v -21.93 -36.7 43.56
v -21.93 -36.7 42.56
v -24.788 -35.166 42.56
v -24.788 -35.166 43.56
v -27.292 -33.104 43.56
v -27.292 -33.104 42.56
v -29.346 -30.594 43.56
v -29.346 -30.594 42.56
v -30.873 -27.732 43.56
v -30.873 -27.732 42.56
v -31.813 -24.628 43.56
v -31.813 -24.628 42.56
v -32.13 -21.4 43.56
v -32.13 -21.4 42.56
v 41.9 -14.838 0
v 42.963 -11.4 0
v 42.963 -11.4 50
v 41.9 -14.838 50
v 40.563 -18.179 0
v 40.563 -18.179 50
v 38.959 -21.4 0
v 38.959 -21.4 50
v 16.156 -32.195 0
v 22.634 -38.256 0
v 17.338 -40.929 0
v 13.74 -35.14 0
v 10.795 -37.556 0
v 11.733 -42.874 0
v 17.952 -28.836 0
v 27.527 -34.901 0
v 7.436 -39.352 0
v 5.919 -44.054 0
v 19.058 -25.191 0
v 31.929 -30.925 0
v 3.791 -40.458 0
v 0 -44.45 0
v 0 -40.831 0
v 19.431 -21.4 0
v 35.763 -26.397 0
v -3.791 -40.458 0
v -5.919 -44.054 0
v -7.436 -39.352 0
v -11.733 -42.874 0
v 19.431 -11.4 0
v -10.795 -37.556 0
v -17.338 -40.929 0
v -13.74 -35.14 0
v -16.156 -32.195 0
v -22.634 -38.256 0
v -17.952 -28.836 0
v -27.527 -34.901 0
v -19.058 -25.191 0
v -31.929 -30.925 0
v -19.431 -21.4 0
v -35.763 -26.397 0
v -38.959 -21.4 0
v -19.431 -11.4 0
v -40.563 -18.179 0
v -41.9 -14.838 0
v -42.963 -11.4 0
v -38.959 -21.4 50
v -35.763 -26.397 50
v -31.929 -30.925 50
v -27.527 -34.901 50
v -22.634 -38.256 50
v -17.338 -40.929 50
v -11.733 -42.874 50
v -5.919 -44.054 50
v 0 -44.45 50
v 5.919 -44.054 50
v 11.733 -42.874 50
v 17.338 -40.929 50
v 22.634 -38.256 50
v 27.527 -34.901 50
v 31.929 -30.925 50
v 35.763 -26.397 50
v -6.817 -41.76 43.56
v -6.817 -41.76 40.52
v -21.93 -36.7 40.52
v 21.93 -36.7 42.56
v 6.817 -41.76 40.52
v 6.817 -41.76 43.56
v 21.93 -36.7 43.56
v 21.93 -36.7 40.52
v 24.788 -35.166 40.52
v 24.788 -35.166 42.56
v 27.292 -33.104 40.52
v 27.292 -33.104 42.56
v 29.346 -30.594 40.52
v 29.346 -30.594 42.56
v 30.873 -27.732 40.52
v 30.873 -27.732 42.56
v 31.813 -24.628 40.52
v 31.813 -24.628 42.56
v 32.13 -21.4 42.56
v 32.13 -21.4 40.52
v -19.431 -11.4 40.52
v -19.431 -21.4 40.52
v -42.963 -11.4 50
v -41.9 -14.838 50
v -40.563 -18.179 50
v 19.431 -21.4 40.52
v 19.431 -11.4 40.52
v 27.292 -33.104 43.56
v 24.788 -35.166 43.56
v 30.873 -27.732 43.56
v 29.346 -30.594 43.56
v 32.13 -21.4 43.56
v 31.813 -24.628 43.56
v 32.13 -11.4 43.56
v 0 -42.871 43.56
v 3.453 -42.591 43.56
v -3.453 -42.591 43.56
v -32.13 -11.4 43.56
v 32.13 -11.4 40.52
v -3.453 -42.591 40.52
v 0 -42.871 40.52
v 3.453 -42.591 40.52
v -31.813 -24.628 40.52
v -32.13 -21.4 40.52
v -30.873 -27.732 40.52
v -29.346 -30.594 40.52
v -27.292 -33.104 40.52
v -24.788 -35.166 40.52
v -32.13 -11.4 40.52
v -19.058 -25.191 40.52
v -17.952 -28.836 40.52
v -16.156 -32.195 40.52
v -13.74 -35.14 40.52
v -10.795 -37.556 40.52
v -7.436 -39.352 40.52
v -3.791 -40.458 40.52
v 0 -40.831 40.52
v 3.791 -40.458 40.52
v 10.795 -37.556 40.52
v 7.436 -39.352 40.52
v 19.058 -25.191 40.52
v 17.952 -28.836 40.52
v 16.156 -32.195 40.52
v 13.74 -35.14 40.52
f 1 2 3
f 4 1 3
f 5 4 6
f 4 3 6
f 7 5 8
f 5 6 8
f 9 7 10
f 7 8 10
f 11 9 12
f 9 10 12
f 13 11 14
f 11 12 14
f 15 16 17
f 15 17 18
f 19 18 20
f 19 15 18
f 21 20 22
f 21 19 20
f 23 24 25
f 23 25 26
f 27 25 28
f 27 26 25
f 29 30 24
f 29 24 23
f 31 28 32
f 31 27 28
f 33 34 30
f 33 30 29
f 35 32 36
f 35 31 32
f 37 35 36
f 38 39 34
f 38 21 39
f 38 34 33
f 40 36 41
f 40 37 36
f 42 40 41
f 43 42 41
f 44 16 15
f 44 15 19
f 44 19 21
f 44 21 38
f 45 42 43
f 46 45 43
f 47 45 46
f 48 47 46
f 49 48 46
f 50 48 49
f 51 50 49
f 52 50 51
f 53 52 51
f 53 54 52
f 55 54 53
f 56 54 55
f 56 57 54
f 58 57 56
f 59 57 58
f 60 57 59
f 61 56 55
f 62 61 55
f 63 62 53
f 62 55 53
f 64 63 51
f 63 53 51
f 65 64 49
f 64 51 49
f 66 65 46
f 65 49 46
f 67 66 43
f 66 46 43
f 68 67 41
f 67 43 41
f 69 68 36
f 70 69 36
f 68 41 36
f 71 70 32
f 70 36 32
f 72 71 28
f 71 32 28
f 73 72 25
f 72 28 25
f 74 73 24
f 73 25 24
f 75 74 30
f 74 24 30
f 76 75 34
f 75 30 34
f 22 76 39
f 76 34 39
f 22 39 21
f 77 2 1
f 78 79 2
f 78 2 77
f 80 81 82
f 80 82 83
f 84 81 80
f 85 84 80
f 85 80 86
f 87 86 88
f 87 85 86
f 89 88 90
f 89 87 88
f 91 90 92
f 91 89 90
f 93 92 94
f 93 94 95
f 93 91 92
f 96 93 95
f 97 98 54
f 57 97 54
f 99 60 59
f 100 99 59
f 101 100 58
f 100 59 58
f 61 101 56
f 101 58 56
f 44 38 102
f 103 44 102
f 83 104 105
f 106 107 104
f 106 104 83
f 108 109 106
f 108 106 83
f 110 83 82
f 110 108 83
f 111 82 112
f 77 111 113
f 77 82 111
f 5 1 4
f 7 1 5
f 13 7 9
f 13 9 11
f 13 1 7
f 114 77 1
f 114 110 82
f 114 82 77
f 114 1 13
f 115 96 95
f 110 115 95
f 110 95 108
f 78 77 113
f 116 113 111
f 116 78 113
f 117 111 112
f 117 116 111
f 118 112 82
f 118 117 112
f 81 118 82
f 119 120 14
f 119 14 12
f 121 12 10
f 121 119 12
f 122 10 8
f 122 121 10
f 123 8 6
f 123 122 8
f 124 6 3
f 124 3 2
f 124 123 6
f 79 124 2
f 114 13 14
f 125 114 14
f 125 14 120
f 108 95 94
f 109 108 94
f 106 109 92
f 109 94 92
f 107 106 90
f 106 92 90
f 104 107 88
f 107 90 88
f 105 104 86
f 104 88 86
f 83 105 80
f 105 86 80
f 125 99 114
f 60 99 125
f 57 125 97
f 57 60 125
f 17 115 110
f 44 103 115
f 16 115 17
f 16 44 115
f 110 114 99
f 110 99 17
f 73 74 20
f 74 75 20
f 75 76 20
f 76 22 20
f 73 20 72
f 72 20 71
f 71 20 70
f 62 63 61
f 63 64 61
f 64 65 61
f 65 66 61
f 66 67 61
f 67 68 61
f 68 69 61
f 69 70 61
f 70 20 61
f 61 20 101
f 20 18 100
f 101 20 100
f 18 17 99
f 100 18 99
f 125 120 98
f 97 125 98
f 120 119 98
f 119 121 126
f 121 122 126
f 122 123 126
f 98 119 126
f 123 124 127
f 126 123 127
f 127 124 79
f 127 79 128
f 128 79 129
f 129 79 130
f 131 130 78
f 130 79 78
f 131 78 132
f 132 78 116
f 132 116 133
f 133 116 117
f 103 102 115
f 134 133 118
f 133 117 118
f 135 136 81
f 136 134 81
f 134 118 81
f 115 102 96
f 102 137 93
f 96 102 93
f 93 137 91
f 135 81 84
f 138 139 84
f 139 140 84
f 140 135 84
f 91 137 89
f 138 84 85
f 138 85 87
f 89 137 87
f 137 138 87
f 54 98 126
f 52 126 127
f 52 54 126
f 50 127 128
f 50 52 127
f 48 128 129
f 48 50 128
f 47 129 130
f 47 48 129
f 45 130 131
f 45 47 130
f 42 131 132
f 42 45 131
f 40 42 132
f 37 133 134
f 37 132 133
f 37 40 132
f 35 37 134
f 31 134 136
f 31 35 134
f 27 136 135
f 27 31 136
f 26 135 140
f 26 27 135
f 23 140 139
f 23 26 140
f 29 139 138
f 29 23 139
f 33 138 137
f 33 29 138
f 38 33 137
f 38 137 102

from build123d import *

# Parameters (mm, degrees)
BOSS_EXTRUDE1_DEPTH = 50
CAVITY1_DEPTH       = 42.56
CAVITY1_START       = 40.52
CAVITY1_2_DEPTH     = 2.04
CAVITY1_START_2     = 41.54
CAVITY1_3_DEPTH     = 1.02
CUT_EXTRUDE1_START  = -42.56
CUT_EXTRUDE1_DEPTH  = 42.56
CUT_EXTRUDE2_DEPTH  = 80.011407404
BOSS_EXTRUDE2_DEPTH = 10
CUT_EXTRUDE3_DEPTH  = 1
SKETCH7_W           = 6.44
SKETCH7_H           = 10
BOSS_EXTRUDE3_DEPTH = 38.862
BOSS_EXTRUDE4_DEPTH = 50


# Read off the part's stored shape, not the designer's step: Cavity1
with BuildPart() as part:
    # Sketch1 → Boss-Extrude1 (new body)
    with BuildSketch(Plane.XY):
        with BuildLine():
            Line((42.035699114, -14.45), (-42.035699114, -14.45))
            ThreePointArc((-42.035699114, -14.45), (0, -44.45), (42.035699114, -14.45))
        make_face()
    extrude(amount=BOSS_EXTRUDE1_DEPTH)

    # Cavity1 outline → Cavity1 (cut)
    with BuildSketch(Plane.XY):
        with BuildLine():
            ThreePointArc((-18.145557611, -14.45), (0, -40.831), (18.145557611, -14.45))
            Line((18.145557611, -14.45), (13.723350293, -14.45))
            ThreePointArc((13.723350293, -14.45), (0, -36.782875), (-13.723350293, -14.45))
            Line((-13.723350293, -14.45), (-18.145557611, -14.45))
        make_face()
    extrude(amount=CAVITY1_DEPTH, mode=Mode.SUBTRACT)

    # Cavity1 2 outline → Cavity1 2 (cut)
    with BuildSketch(Plane.XY.offset(CAVITY1_START)):
        with BuildLine():
            Line((30.602528867, -14.45), (18.145557611, -14.45))
            ThreePointArc((18.145557611, -14.45), (0, -40.831), (-18.145557611, -14.45))
            Line((-18.145557611, -14.45), (-30.602528867, -14.45))
            ThreePointArc((-30.602528867, -14.45), (-30.998341956, -27.419452985), (-21.93, -36.7))
            Line((-21.93, -36.7), (-6.816880824, -41.760107486))
            ThreePointArc((-6.816880824, -41.760107486), (0, -42.871), (6.816880824, -41.760107486))
            Line((6.816880824, -41.760107486), (21.93, -36.7))
            ThreePointArc((21.93, -36.7), (30.998341956, -27.419452985), (30.602528867, -14.45))
        make_face()
    extrude(amount=CAVITY1_2_DEPTH, mode=Mode.SUBTRACT)

    # Cavity1 3 outline → Cavity1 3 (cut)
    with BuildSketch(Plane.XY.offset(CAVITY1_START_2)):
        with BuildLine():
            ThreePointArc((-13.723350293, -14.45), (0, -36.782875), (13.723350293, -14.45))
            Line((13.723350293, -14.45), (7.578589464, -14.45))
            ThreePointArc((7.578589464, -14.45), (0, -31.682875), (-7.578589464, -14.45))
            Line((-7.578589464, -14.45), (-13.723350293, -14.45))
        make_face()
    extrude(amount=CAVITY1_3_DEPTH, mode=Mode.SUBTRACT)

    # Sketch2 → Cut-Extrude1 (cut)
    with BuildSketch(Plane(origin=(0, 0, 0), x_dir=(-1, 0, 0), z_dir=(0, 0, -1)).offset(CUT_EXTRUDE1_START)):
        with BuildLine():
            Line((13.723350293, -14.45), (-13.723350293, -14.45))
            ThreePointArc((-13.723350293, -14.45), (0, -36.782875), (13.723350293, -14.45))
        make_face()
    extrude(amount=CUT_EXTRUDE1_DEPTH, mode=Mode.SUBTRACT)

    # Sketch4 → Cut-Extrude2 (cut, through all)
    with BuildSketch(Plane(origin=(0, 0, 0), x_dir=(-1, 0, 0), z_dir=(0, 0, -1))):
        with BuildLine():
            ThreePointArc((-42.035699114, -14.45), (-40.646415857, -17.990869296), (-38.9594982, -21.4))
            Line((-38.9594982, -21.4), (-19.431, -21.4))
            ThreePointArc((-19.431, -21.4), (-19.106937103, -17.866062319), (-18.145557611, -14.45))
            Line((-18.145557611, -14.45), (-42.035699114, -14.45))
        make_face()
        with BuildLine():
            Line((19.431, -21.4), (38.9594982, -21.4))
            ThreePointArc((38.9594982, -21.4), (40.646415857, -17.990869296), (42.035699114, -14.45))
            Line((42.035699114, -14.45), (18.145557611, -14.45))
            ThreePointArc((18.145557611, -14.45), (19.106937103, -17.866062319), (19.431, -21.4))
        make_face()
    extrude(amount=-CUT_EXTRUDE2_DEPTH, mode=Mode.SUBTRACT)

    # Sketch5 → Boss-Extrude2 (add)
    with BuildSketch(Plane(origin=(0, -21.4, 0), x_dir=(1, 0, 0), z_dir=(0, 1, 0))):
        Polygon((-32.13, -42.56), (-32.13, -40.52), (-19.431, -40.52), (-19.431, 0), (-38.9594982, 0), (-38.9594982, -50), (-19.431, -50), (-19.431, -42.56), align=None)
        Polygon((19.431, -42.56), (19.431, -50), (38.9594982, -50), (38.9594982, 0), (19.431, 0), (19.431, -40.52), (32.13, -40.52), (32.13, -42.56), align=None)
    extrude(amount=BOSS_EXTRUDE2_DEPTH)

    # Sketch6 → Cut-Extrude3 (cut)
    with BuildSketch(Plane(origin=(0, 0, 42.56), x_dir=(-1, 0, 0), z_dir=(0, 0, -1))):
        with BuildLine():
            Line((-19.431, -21.4), (-19.431, -11.4))
            Line((-19.431, -11.4), (-32.13, -11.4))
            Line((-32.13, -11.4), (-32.13, -21.4))
            ThreePointArc((-32.13, -21.4), (-29.346233629, -30.594155752), (-21.93, -36.7))
            Line((-21.93, -36.7), (-6.816880824, -41.760107486))
            ThreePointArc((-6.816880824, -41.760107486), (0, -42.871), (6.816880824, -41.760107486))
            Line((6.816880824, -41.760107486), (21.93, -36.7))
            ThreePointArc((21.93, -36.7), (29.346233629, -30.594155752), (32.13, -21.4))
            Line((32.13, -21.4), (32.13, -11.4))
            Line((32.13, -11.4), (19.431, -11.4))
            Line((19.431, -11.4), (19.431, -21.4))
            ThreePointArc((19.431, -21.4), (19.106937103, -17.866062319), (18.145557611, -14.45))
            Line((18.145557611, -14.45), (-18.145557611, -14.45))
            ThreePointArc((-18.145557611, -14.45), (-19.106937103, -17.866062319), (-19.431, -21.4))
        make_face()
    extrude(amount=-CUT_EXTRUDE3_DEPTH, mode=Mode.SUBTRACT)

    # Sketch7 → Boss-Extrude3 (add)
    with BuildSketch(Plane.ZY.offset(-19.431)):
        with Locations((46.78, -16.4)):
            Rectangle(SKETCH7_W, SKETCH7_H)
    extrude(amount=BOSS_EXTRUDE3_DEPTH)

    # Sketch8 → Boss-Extrude4 (add, through all)
    with BuildSketch(Plane(origin=(0, 0, 0), x_dir=(-1, 0, 0), z_dir=(0, 0, -1))):
        with BuildLine():
            Line((-38.9594982, -21.4), (-38.9594982, -11.4))
            Line((-38.9594982, -11.4), (-42.963269196, -11.4))
            ThreePointArc((-42.963269196, -11.4), (-41.265420808, -16.521729496), (-38.9594982, -21.4))
        make_face()
        with BuildLine():
            Line((38.9594982, -11.4), (42.963269196, -11.4))
            ThreePointArc((42.963269196, -11.4), (41.265420808, -16.521729496), (38.9594982, -21.4))
            Line((38.9594982, -21.4), (38.9594982, -11.4))
        make_face()
    extrude(amount=-BOSS_EXTRUDE4_DEPTH)


solid = part.part
